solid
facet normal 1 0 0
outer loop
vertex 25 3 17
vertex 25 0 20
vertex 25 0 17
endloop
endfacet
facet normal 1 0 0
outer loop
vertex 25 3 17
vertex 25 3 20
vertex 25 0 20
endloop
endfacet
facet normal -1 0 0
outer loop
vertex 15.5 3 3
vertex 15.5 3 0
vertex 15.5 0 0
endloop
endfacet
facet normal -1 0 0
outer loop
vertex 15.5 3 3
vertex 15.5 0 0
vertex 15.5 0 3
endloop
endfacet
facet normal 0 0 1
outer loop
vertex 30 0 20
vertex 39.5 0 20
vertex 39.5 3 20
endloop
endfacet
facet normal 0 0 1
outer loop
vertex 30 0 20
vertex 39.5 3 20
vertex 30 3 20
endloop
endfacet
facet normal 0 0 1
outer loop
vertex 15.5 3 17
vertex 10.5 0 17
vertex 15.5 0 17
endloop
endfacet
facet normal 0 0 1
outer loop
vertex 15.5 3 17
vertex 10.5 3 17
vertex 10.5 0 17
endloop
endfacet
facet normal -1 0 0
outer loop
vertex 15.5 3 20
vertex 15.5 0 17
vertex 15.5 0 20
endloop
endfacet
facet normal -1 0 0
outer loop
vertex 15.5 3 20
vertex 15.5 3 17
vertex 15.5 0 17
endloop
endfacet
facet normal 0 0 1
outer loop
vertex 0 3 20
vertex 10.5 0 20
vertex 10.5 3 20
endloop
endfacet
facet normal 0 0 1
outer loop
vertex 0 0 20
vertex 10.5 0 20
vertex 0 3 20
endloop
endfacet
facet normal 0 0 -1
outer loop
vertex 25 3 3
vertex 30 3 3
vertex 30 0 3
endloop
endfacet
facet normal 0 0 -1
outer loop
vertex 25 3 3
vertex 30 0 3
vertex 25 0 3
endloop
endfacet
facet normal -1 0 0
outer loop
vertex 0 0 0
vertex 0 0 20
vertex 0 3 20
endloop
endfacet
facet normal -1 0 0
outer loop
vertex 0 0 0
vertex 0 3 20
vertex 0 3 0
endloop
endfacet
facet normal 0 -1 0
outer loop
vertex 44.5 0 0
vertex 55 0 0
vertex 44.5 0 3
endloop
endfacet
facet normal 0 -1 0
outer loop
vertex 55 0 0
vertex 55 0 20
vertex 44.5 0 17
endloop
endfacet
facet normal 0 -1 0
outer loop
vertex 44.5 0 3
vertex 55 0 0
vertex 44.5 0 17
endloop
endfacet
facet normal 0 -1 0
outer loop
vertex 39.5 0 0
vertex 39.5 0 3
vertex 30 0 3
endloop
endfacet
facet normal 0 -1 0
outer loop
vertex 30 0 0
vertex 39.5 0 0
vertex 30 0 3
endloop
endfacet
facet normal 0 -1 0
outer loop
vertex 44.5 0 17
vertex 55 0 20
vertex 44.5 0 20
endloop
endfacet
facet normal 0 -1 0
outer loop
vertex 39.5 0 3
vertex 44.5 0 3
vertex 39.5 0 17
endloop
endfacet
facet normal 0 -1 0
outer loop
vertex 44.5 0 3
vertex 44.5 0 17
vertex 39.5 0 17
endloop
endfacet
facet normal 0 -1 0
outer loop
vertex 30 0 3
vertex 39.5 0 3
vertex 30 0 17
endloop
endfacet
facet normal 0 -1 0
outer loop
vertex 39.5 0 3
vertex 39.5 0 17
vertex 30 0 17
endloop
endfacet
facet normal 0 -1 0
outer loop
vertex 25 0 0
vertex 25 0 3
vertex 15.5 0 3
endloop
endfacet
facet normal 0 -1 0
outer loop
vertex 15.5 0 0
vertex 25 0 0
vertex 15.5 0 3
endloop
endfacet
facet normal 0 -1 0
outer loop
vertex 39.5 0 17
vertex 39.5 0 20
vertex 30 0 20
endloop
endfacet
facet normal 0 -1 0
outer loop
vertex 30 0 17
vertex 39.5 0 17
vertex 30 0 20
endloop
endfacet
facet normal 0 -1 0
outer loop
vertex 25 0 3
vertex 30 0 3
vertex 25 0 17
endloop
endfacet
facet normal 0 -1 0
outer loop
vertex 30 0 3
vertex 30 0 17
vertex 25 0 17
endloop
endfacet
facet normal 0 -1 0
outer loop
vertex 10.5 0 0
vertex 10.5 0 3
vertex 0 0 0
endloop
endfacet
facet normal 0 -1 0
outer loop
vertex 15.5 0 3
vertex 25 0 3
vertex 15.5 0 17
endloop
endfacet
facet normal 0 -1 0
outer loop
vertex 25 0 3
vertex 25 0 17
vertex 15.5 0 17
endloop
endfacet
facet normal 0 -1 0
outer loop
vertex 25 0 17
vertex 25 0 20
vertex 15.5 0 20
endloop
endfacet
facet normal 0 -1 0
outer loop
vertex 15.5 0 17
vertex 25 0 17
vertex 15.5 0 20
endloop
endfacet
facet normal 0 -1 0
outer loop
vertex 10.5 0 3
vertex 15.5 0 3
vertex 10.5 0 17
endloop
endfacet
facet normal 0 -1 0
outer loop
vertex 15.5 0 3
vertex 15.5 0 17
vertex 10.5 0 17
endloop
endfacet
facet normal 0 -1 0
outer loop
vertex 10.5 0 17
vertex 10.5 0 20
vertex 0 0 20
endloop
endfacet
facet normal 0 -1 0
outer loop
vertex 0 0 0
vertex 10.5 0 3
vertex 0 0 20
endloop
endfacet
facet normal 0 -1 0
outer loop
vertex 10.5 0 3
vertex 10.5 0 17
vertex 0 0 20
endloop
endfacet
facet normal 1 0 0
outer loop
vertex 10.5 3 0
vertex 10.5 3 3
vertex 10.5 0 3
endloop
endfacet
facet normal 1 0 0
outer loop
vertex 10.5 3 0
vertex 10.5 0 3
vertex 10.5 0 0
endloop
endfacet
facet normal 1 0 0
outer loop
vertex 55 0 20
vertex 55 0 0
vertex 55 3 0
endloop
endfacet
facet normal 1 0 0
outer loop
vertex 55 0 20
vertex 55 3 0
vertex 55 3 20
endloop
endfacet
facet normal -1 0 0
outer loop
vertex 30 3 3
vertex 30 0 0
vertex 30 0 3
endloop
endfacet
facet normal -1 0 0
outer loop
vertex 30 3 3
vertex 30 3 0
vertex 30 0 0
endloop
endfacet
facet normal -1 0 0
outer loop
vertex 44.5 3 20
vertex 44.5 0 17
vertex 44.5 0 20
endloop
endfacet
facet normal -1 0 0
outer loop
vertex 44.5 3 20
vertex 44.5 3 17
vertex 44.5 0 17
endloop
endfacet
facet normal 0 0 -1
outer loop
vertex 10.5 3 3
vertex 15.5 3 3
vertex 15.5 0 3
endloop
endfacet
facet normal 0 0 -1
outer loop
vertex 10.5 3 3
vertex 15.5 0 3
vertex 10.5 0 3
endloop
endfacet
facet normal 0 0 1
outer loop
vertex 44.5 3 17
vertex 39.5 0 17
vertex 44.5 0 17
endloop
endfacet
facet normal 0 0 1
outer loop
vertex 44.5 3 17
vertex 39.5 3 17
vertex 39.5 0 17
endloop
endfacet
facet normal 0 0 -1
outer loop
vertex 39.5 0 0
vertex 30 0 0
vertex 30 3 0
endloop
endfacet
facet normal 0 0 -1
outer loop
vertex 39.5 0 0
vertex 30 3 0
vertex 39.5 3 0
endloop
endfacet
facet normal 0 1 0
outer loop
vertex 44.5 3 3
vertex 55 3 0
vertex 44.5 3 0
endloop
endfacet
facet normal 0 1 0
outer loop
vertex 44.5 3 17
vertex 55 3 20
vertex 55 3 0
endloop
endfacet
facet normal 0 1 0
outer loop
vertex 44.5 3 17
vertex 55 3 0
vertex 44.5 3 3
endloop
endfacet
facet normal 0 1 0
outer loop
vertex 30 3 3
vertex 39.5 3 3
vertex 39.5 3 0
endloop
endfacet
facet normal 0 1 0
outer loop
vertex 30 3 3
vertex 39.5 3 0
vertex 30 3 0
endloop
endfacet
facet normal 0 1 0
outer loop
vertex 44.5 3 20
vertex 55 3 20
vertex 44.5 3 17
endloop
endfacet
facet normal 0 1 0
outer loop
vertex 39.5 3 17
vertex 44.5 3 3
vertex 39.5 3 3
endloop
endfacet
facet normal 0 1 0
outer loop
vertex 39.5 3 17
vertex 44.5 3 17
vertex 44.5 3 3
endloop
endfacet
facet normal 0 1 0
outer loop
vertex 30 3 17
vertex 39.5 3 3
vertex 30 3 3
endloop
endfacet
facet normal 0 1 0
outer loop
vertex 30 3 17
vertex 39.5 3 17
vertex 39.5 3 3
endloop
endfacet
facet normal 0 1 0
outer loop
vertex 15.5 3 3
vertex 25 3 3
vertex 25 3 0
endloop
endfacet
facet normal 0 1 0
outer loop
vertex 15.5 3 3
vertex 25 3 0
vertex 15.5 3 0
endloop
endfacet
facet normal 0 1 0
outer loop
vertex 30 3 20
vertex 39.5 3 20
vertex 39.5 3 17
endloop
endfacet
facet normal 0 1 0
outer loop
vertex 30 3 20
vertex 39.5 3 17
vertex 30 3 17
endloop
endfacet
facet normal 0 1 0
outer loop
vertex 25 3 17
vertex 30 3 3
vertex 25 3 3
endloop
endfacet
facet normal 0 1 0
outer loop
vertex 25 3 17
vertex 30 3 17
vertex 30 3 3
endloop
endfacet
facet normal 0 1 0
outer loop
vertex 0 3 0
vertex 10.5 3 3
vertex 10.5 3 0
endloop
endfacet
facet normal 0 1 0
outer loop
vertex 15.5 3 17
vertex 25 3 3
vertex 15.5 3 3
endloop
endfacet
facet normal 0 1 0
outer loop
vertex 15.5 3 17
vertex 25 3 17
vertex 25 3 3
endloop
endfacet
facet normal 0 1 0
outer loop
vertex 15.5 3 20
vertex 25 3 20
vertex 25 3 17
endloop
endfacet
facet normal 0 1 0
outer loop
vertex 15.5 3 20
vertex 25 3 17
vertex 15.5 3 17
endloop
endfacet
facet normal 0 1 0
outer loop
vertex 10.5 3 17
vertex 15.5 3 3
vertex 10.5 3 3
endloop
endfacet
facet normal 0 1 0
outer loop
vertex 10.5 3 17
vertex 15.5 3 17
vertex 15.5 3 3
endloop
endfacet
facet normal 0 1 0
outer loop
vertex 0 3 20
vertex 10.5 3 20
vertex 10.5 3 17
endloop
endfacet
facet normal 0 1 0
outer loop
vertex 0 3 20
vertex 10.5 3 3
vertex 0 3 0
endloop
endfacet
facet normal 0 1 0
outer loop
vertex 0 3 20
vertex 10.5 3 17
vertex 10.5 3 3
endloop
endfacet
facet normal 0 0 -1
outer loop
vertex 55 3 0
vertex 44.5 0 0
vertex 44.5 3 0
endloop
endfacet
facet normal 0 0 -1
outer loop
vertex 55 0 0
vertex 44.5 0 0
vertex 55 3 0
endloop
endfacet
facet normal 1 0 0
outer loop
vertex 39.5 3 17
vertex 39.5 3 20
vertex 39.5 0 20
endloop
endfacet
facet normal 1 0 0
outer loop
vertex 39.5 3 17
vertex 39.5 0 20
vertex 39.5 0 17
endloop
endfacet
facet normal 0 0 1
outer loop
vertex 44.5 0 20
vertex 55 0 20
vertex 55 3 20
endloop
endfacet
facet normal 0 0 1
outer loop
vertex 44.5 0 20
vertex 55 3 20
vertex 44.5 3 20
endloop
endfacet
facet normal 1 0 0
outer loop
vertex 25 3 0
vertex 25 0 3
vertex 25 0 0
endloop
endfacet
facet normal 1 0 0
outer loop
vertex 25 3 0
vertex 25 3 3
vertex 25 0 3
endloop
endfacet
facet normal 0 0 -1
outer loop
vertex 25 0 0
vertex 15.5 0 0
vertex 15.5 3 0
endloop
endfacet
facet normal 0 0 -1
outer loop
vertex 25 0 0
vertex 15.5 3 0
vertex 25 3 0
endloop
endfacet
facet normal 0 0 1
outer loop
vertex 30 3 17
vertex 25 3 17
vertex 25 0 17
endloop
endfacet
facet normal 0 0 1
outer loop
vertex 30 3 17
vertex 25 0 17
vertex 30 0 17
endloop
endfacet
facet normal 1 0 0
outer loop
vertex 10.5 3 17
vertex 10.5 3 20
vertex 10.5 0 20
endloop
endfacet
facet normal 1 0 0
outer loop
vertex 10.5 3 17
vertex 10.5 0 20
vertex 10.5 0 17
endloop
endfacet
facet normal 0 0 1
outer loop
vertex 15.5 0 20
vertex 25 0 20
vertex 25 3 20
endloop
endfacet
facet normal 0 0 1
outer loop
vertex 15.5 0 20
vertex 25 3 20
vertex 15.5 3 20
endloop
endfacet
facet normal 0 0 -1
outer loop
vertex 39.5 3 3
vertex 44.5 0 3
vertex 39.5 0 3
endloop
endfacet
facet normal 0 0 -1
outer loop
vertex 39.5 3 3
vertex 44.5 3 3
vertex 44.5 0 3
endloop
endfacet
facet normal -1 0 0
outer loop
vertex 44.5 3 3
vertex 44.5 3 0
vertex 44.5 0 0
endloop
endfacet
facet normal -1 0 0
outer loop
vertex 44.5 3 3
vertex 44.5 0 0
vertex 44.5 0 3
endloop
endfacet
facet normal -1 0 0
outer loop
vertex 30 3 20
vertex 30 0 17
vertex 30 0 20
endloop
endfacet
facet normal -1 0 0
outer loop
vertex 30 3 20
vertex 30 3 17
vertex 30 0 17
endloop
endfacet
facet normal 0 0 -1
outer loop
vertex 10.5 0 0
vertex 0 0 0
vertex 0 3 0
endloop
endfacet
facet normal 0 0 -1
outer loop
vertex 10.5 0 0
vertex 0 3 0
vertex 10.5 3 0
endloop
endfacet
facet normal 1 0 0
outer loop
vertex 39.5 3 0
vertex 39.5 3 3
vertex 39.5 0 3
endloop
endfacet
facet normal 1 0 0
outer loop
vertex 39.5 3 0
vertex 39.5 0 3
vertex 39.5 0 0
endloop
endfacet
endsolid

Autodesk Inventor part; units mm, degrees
ref_plane "YZ Plane" through (0, 0, 0) normal (1, 0, 0) x (0, 1, 0)
ref_plane "XZ Plane" through (0, 0, 0) normal (0, 1, 0) x (-1, 0, 0)
sketch "Sketch1" plane through (0, 0, 0) normal (0, 1, 0) x (-1, 0, 0)
  line L0 (0, 0) -> (-55, 0)
  line L1 (-55, 0) -> (-55, 20)
  line L2 (-55, 20) -> (0, 20)
  line L3 (0, 20) -> (0, 0)
  dimension "d0" = 55
  dimension "d1" = 20
extrude "Extrusion1" add sketch "Sketch1" along normal blind 3
sketch "Sketch2" plane through (0, 3, 0) normal (0, 1, 0) x (1, 0, 0)
  line L0 (0, -20) -> (55, -20) projected
  line L1 (55, -20) -> (55, 0) projected
  line L2 (44.5, -20) -> (39.5, -20)
  line L3 (39.5, -20) -> (39.5, -17)
  line L4 (39.5, -17) -> (44.5, -17)
  line L5 (44.5, -17) -> (44.5, -20)
  line L6 (30, -20) -> (25, -20)
  line L7 (25, -20) -> (25, -17)
  line L8 (25, -17) -> (30, -17)
  line L9 (30, -17) -> (30, -20)
  line L10 (15.5, -20) -> (10.5, -20)
  line L11 (10.5, -20) -> (10.5, -17)
  line L12 (10.5, -17) -> (15.5, -17)
  line L13 (15.5, -17) -> (15.5, -20)
  point P0 (0, 0)
  dimension "d5" = 3
  dimension "d7" = 3
  dimension "d9" = 3
  dimension "d13" = 55
  dimension "d16" = 34
  dimension "d17" = 9.5
  dimension "d18" = 9.5
  dimension "d19" = 5
  dimension "d20" = 5
  dimension "d21" = 10.5
extrude "Extrusion2" cut sketch "Sketch2" against normal blind 3
ref_plane "Work Plane1" through (55, 0, 10) normal (0, 0, 1) x (1, 0, 0)
mirror "Mirror1" about plane through (55, 0, 10) normal (0, 0, 1) of "Extrusion2"
equation "\"d18\" = d17"
equation "\"d20\" = d19"
equation "\"d21\" = -d17 + 0.5 * d13 - 1.5 * d19"
properties part number "unionpress" material "Glass"
